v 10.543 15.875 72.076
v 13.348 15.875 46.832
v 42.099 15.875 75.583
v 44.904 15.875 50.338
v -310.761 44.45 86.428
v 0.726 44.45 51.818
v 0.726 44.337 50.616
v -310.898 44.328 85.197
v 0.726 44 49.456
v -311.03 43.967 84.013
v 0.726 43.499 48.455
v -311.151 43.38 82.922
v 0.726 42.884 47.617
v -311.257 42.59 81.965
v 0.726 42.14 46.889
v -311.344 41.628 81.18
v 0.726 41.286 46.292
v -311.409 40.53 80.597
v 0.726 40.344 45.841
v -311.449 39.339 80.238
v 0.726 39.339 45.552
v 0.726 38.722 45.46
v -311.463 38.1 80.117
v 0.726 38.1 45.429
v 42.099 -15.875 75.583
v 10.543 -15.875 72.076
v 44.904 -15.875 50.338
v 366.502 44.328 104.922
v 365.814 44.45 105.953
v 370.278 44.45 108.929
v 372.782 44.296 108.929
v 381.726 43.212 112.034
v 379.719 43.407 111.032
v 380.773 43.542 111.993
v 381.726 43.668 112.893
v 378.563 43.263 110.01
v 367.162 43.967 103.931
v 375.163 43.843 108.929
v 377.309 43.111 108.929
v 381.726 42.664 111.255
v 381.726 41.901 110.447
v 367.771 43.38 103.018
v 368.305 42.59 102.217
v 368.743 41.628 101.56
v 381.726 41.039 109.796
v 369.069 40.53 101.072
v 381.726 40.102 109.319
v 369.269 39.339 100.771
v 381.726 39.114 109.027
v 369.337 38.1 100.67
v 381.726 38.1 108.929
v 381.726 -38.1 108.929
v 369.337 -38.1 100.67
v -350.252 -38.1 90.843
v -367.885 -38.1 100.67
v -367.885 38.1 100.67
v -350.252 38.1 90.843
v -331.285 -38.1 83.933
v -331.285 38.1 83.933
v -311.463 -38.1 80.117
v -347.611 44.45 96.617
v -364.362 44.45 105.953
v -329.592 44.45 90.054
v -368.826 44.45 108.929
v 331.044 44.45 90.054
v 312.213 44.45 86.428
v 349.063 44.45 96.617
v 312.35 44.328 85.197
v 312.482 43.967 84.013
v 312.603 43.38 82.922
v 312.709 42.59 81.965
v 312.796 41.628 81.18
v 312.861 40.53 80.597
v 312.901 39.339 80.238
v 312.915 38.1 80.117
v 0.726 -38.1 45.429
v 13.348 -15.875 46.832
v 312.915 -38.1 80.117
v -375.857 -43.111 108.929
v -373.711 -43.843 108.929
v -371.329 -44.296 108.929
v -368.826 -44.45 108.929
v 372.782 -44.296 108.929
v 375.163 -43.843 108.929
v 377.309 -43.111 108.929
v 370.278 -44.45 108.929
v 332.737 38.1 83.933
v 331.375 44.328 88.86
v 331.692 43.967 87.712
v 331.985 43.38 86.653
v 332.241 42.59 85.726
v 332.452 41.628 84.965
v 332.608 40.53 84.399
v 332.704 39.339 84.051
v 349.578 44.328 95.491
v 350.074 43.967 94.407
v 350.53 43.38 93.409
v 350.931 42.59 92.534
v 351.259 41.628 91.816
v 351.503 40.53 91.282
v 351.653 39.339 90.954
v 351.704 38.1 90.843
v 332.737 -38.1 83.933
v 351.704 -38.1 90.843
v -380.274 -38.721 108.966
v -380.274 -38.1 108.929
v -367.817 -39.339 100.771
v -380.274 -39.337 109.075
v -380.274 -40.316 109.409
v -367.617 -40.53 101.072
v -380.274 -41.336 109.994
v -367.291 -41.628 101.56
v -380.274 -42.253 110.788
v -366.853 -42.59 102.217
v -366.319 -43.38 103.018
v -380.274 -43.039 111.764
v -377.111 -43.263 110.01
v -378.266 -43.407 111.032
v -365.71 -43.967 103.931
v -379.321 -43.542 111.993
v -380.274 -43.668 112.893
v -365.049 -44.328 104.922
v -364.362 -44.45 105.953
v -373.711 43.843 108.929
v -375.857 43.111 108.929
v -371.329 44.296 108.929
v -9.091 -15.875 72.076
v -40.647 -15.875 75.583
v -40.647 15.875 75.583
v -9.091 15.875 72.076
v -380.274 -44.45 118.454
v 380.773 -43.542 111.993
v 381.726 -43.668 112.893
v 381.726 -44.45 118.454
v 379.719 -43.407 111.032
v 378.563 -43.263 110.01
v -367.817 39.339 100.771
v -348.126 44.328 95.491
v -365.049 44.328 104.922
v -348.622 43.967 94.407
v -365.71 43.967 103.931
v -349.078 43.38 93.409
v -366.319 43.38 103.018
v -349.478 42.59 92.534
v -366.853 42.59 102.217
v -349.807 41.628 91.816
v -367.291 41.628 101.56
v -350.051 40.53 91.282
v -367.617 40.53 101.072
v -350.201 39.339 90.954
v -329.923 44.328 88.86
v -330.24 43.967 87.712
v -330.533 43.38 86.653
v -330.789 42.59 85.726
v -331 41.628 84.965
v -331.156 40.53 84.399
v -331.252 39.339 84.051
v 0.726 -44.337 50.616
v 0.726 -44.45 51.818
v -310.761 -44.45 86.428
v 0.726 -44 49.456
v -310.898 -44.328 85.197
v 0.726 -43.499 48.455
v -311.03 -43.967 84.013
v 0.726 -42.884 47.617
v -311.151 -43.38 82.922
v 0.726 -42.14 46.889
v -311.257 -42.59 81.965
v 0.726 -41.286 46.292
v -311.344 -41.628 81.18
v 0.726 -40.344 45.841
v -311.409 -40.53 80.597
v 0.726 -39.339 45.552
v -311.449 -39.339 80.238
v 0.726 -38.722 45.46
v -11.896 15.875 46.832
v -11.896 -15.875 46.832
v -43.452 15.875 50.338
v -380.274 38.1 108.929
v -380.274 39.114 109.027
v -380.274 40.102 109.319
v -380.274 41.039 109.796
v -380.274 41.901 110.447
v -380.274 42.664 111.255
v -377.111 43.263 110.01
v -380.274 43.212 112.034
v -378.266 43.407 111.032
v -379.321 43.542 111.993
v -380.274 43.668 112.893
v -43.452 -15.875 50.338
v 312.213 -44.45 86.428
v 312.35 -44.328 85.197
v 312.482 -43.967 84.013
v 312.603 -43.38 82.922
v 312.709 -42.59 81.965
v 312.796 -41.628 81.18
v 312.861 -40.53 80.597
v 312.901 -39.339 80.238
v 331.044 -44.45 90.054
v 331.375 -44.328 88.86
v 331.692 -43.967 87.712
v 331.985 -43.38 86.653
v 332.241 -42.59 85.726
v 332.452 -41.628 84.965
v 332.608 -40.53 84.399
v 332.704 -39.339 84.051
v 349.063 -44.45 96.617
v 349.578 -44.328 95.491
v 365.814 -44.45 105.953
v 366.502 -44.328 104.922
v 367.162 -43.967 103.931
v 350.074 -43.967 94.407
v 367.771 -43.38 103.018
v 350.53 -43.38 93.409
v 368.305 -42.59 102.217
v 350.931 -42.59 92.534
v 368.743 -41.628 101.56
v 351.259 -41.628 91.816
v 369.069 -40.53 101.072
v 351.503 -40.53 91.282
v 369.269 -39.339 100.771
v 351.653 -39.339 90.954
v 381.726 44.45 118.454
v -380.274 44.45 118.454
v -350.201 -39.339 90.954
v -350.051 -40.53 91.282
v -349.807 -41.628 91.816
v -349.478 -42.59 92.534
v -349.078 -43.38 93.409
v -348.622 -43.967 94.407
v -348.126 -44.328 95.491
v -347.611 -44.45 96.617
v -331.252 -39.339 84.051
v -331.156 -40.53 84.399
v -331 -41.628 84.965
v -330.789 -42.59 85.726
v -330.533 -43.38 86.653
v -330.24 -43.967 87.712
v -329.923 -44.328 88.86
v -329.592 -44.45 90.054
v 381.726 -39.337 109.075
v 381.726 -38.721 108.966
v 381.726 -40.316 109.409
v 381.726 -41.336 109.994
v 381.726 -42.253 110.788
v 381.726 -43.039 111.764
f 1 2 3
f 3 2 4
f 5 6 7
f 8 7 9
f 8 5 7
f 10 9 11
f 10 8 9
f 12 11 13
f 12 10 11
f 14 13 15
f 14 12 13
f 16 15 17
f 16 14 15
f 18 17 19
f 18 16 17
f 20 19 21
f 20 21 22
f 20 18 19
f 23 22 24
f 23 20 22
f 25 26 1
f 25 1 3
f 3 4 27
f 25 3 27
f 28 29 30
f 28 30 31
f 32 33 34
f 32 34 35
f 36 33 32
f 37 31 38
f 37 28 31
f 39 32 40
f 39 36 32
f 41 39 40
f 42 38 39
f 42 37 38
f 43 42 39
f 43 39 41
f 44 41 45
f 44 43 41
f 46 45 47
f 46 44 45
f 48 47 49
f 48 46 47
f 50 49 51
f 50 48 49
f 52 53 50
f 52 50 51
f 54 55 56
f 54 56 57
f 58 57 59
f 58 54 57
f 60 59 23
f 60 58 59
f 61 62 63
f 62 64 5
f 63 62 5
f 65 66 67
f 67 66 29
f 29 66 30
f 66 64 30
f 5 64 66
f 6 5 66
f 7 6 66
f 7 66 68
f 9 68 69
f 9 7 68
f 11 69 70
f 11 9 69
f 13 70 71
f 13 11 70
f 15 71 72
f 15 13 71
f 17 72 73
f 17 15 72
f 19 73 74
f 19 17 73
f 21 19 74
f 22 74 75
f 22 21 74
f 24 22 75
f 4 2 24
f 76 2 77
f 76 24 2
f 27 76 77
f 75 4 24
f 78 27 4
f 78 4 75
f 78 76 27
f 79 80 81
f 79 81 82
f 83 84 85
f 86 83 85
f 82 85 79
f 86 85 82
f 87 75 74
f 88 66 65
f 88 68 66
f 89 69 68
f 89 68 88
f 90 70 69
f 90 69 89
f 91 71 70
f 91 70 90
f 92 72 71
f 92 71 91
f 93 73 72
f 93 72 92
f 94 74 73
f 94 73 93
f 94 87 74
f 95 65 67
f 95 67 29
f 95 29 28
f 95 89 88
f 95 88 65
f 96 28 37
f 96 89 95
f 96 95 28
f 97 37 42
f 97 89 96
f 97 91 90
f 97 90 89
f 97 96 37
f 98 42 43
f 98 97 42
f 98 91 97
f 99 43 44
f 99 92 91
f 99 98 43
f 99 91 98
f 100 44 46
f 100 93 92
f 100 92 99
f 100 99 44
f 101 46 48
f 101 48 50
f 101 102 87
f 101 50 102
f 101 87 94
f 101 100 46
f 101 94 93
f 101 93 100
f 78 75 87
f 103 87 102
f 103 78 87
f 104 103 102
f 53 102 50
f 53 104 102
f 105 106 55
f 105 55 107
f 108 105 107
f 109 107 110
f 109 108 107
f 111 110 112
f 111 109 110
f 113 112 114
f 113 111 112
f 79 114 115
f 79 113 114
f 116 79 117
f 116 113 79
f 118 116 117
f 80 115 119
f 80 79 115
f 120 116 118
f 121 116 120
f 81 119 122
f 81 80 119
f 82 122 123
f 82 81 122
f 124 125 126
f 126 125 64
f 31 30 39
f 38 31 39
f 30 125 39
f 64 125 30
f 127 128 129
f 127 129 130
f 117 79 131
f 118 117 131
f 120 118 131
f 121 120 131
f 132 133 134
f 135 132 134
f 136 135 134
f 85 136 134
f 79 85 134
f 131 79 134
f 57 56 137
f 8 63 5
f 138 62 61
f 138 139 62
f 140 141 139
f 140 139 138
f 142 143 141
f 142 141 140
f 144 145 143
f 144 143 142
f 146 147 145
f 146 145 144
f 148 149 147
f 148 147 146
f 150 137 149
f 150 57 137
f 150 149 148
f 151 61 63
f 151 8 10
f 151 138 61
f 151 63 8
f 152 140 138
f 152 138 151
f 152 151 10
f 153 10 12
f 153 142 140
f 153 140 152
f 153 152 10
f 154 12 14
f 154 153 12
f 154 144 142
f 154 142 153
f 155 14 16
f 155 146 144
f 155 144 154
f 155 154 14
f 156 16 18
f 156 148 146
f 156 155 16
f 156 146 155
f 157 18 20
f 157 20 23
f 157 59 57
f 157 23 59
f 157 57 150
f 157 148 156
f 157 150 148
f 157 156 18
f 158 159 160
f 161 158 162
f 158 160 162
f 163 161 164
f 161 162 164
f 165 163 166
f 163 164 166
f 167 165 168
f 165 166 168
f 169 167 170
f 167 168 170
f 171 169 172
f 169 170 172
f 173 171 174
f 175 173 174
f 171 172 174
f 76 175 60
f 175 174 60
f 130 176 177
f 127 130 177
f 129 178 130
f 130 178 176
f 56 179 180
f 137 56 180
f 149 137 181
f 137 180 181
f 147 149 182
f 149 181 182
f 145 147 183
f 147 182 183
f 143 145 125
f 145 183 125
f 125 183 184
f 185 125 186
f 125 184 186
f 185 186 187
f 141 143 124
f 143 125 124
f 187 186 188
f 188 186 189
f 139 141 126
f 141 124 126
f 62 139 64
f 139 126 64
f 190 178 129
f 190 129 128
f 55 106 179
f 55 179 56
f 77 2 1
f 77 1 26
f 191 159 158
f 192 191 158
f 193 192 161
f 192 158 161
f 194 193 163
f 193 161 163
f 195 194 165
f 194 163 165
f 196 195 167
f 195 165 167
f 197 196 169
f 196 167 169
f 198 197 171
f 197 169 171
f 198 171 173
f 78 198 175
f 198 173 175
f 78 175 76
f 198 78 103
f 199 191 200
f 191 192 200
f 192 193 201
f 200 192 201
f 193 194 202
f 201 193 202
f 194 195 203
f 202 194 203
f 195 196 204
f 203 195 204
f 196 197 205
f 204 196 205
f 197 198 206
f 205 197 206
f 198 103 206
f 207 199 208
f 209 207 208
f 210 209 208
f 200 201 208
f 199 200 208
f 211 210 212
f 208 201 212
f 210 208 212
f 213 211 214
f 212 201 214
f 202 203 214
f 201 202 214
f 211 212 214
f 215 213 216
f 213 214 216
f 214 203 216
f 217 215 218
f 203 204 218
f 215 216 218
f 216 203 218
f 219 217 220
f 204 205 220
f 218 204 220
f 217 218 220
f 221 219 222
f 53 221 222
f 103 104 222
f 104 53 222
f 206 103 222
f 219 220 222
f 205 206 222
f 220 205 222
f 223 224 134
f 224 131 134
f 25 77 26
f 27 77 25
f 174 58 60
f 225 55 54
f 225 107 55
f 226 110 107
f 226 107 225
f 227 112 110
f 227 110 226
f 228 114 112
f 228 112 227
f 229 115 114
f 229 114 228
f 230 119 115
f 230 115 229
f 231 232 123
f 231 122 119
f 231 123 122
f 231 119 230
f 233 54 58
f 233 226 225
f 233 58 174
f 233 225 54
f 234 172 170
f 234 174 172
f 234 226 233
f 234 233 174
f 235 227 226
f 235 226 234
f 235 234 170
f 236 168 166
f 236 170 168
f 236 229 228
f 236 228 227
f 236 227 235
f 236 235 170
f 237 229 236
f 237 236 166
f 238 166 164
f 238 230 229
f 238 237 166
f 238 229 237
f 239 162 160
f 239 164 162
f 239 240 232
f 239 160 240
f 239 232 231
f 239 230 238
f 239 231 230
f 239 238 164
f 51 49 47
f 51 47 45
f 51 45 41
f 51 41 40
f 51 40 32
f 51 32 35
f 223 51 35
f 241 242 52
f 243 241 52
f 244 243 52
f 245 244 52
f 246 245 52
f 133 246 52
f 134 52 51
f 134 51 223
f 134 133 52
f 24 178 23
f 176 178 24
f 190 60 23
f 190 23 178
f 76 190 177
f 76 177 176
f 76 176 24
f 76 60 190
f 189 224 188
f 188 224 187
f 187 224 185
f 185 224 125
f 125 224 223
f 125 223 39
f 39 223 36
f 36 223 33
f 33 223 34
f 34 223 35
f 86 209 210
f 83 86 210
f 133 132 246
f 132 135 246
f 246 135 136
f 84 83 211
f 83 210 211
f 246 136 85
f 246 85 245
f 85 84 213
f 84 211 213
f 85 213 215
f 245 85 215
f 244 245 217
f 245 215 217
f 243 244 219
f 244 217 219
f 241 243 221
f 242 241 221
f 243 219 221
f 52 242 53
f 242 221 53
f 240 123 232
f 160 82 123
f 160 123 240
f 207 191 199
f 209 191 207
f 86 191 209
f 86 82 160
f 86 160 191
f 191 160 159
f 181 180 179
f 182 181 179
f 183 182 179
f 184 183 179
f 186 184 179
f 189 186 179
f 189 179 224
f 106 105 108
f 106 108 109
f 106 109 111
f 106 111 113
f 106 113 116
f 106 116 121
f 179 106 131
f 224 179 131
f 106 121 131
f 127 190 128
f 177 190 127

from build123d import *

# Parameters (mm, degrees)
F0_W          = 762
F0_H          = 9.525
F1_DEPTH      = 44.45
F2_W          = 31.75
F2_H          = 31.75
F3_DEPTH      = 25.4
F4_W          = 31.75
F4_H          = 31.75
F5_DEPTH      = 25.4
F7_DEPTH      = 762.001
F9_DEPTH      = 762.001
F10_T1_DEPTH  = 361.7347577498
F10_T3_DEPTH  = 361.7347577498
F10_T5_DEPTH  = 30.7650851852
F10_T7_DEPTH  = 30.7650851852
F10_T10_ANGLE = 27.3498757801
F10_T12_ANGLE = 27.3498757801
F10_T14_ANGLE = 27.3498757801
F10_T16_ANGLE = 27.3498757801


# Not quite as in the source:
# - a fillet or chamfer that OpenCascade refuses, or shapes differently, is made with other operations: its cross-section is extruded or revolved along the edge and cut away or added
# - a feature names something its author has since deleted; it is built from what else it names


with BuildPart() as f1:
    # F0 (on Front) → F1 (new body, symmetric)
    with BuildSketch(Plane.XZ):
        with Locations((0.726044178, 113.6916989031)):
            Rectangle(F0_W, F0_H)
        with BuildLine():
            Line((381.726044178, 108.9291989031), (-380.273955822, 108.9291989031))
            Line((-380.273955822, 108.9291989031), (-367.8846560609, 100.669665729))
            ThreePointArc((-367.8846560609, 100.669665729), (-340.9058012367, 87.0105643735), (-311.4625349518, 80.1168188064))
            Line((-311.4625349518, 80.1168188064), (0.726044178, 45.4291989031))
            Line((0.726044178, 45.4291989031), (31.5534211464, 48.8544630107))
            Line((31.5534211464, 48.8544630107), (312.9146233078, 80.1168188064))
            ThreePointArc((312.9146233078, 80.1168188064), (342.3578895927, 87.0105643735), (369.3367444169, 100.669665729))
            Line((369.3367444169, 100.669665729), (381.726044178, 108.9291989031))
        make_face()
    extrude(amount=F1_DEPTH, both=True)

    # F2 (on face) → F3 (cut)
    with BuildSketch(Plane(origin=(4.9949857842, 0, 44.954872058), x_dir=(0.9938837347, 0, -0.1104315261), z_dir=(-0.1104315261, 0, -0.9938837347))):
        with Locations((-32.870212264, 0)):
            Rectangle(F2_W, F2_H)
    extrude(amount=-F3_DEPTH, mode=Mode.SUBTRACT)

    # F4 (on face) → F5 (cut)
    with BuildSketch(Plane(origin=(-4.9772773896, 0, 44.7954965067), x_dir=(0.9938837347, 0, 0.1104315261), z_dir=(0.1104315261, 0, -0.9938837347))):
        with Locations((34.3134192624, 0)):
            Rectangle(F4_W, F4_H)
    extrude(amount=-F5_DEPTH, mode=Mode.SUBTRACT)

    # F6 (on face) → F7 (cut, through all)
    with BuildSketch(Plane.YZ.offset(381.726044178)):
        Polygon((-43.1113485495, 108.9291989031), (-44.45, 118.4541989031), (-44.45, 108.9291989031), align=None)
    extrude(amount=-F7_DEPTH, mode=Mode.SUBTRACT)

    # F8 (on face) → F9 (cut, through all)
    with BuildSketch(Plane.YZ.offset(381.726044178)):
        Polygon((44.45, 108.9291989031), (44.45, 118.4541989031), (43.1113485495, 108.9291989031), align=None)
    extrude(amount=-F9_DEPTH, mode=Mode.SUBTRACT)

    # F10: fillet of radius 6.35 on 4 edges, made by hand

    # F10_s2 → F10_t1 (cut)
    with BuildSketch(Plane(origin=(-316.457520736, 0, 35.1619467484), x_dir=(0, 1, 0), z_dir=(0.9938837347, 0, -0.1104315261))):
        with BuildLine():
            ThreePointArc((-44.45, 51.5815200356), (-42.5901280605, 47.0913919751), (-38.1, 45.2315200356))
            Line((-38.1, 45.2315200356), (-44.45, 45.2315200356))
            Line((-44.45, 45.2315200356), (-44.45, 51.5815200356))
        make_face()
        with BuildLine():
            ThreePointArc((44.45, 51.5815200356), (42.5901280605, 47.0913919751), (38.1, 45.2315200356))
            Line((38.1, 45.2315200356), (44.45, 45.2315200356))
            Line((44.45, 45.2315200356), (44.45, 51.5815200356))
        make_face()
    extrude(amount=F10_T1_DEPTH, mode=Mode.SUBTRACT)

    # F10_s4 → F10_t3 (cut)
    with BuildSketch(Plane(origin=(-41.6303912962, 0, -4.6255990329), x_dir=(0, 1, 0), z_dir=(0.9938837347, 0, 0.1104315261))):
        with BuildLine():
            ThreePointArc((-44.45, 51.4211637025), (-42.5901280605, 46.9310356419), (-38.1, 45.0711637025))
            Line((-38.1, 45.0711637025), (-44.45, 45.0711637025))
            Line((-44.45, 45.0711637025), (-44.45, 51.4211637025))
        make_face()
        with BuildLine():
            ThreePointArc((44.45, 51.4211637025), (42.5901280605, 46.9310356419), (38.1, 45.0711637025))
            Line((38.1, 45.0711637025), (44.45, 45.0711637025))
            Line((44.45, 45.0711637025), (44.45, 51.4211637025))
        make_face()
    extrude(amount=F10_T3_DEPTH, mode=Mode.SUBTRACT)

    # F10_s6 → F10_t5 (cut)
    with BuildSketch(Plane(origin=(-326.7503981008, 0, 217.8335987339), x_dir=(0, 1, 0), z_dir=(0.8320502943, 0, -0.5547001962))):
        with BuildLine():
            ThreePointArc((38.1, -120.3034659045), (42.5901280605, -118.443593965), (44.45, -113.9534659045))
            Line((44.45, -113.9534659045), (44.45, -120.3034659045))
            Line((44.45, -120.3034659045), (38.1, -120.3034659045))
        make_face()
        with BuildLine():
            ThreePointArc((-38.1, -120.3034659045), (-42.5901280605, -118.443593965), (-44.45, -113.9534659045))
            Line((-44.45, -113.9534659045), (-44.45, -120.3034659045))
            Line((-44.45, -120.3034659045), (-38.1, -120.3034659045))
        make_face()
    extrude(amount=F10_T5_DEPTH, mode=Mode.SUBTRACT)

    # F10_s8 → F10_t7 (cut)
    with BuildSketch(Plane(origin=(302.1575918559, 0, 201.4383945706), x_dir=(0, 1, 0), z_dir=(0.8320502943, 0, 0.5547001962))):
        with BuildLine():
            ThreePointArc((44.45, -114.7589396005), (42.5901280605, -119.2490676611), (38.1, -121.1089396005))
            Line((38.1, -121.1089396005), (44.45, -121.1089396005))
            Line((44.45, -121.1089396005), (44.45, -114.7589396005))
        make_face()
        with BuildLine():
            ThreePointArc((-44.45, -114.7589396005), (-42.5901280605, -119.2490676611), (-38.1, -121.1089396005))
            Line((-38.1, -121.1089396005), (-44.45, -121.1089396005))
            Line((-44.45, -121.1089396005), (-44.45, -114.7589396005))
        make_face()
    extrude(amount=F10_T7_DEPTH, mode=Mode.SUBTRACT)

    # F10_s9 → F10_t10 (revolve, cut)
    with BuildSketch(Plane(origin=(-301.1522999171, 0, 200.7681999448), x_dir=(0, 1, 0), z_dir=(-0.8320502943, 0, 0.5547001962))):
        with BuildLine():
            ThreePointArc((44.45, 113.9534659045), (42.5901280605, 118.443593965), (38.1, 120.3034659045))
            Line((38.1, 120.3034659045), (44.45, 120.3034659045))
            Line((44.45, 120.3034659045), (44.45, 113.9534659045))
        make_face()
    revolve(axis=Axis((-297.4377311403, 44.45, 206.34005311), (0, -1, 0)), revolution_arc=F10_T10_ANGLE, mode=Mode.SUBTRACT)

    # F10_s11 → F10_t12 (revolve, cut)
    with BuildSketch(Plane(origin=(317.8919006975, 0, 35.3213222997), x_dir=(0, 1, 0), z_dir=(-0.9938837347, 0, -0.1104315261))):
        with BuildLine():
            ThreePointArc((44.45, -51.4211637025), (42.5901280605, -46.9310356419), (38.1, -45.0711637025))
            Line((38.1, -45.0711637025), (44.45, -45.0711637025))
            Line((44.45, -45.0711637025), (44.45, -51.4211637025))
        make_face()
    revolve(axis=Axis((298.8898194963, 44.45, 206.34005311), (0, -1, 0)), revolution_arc=F10_T12_ANGLE, mode=Mode.SUBTRACT)

    # F10_s13 → F10_t14 (revolve, cut)
    with BuildSketch(Plane(origin=(317.8919006975, 0, 35.3213222997), x_dir=(0, 1, 0), z_dir=(-0.9938837347, 0, -0.1104315261))):
        with BuildLine():
            ThreePointArc((-44.45, -51.4211637025), (-42.5901280605, -46.9310356419), (-38.1, -45.0711637025))
            Line((-38.1, -45.0711637025), (-44.45, -45.0711637025))
            Line((-44.45, -45.0711637025), (-44.45, -51.4211637025))
        make_face()
    revolve(axis=Axis((298.8898194963, -44.45, 206.34005311), (0, -1, 0)), revolution_arc=F10_T14_ANGLE, mode=Mode.SUBTRACT)

    # F10_s15 → F10_t16 (revolve, cut)
    with BuildSketch(Plane(origin=(-301.1522999171, 0, 200.7681999448), x_dir=(0, 1, 0), z_dir=(-0.8320502943, 0, 0.5547001962))):
        with BuildLine():
            ThreePointArc((-38.1, 120.3034659045), (-42.5901280605, 118.443593965), (-44.45, 113.9534659045))
            Line((-44.45, 113.9534659045), (-44.45, 120.3034659045))
            Line((-44.45, 120.3034659045), (-38.1, 120.3034659045))
        make_face()
    revolve(axis=Axis((-297.4377311403, -44.45, 206.34005311), (0, -1, 0)), revolution_arc=F10_T16_ANGLE, mode=Mode.SUBTRACT)


solid = f1.part
